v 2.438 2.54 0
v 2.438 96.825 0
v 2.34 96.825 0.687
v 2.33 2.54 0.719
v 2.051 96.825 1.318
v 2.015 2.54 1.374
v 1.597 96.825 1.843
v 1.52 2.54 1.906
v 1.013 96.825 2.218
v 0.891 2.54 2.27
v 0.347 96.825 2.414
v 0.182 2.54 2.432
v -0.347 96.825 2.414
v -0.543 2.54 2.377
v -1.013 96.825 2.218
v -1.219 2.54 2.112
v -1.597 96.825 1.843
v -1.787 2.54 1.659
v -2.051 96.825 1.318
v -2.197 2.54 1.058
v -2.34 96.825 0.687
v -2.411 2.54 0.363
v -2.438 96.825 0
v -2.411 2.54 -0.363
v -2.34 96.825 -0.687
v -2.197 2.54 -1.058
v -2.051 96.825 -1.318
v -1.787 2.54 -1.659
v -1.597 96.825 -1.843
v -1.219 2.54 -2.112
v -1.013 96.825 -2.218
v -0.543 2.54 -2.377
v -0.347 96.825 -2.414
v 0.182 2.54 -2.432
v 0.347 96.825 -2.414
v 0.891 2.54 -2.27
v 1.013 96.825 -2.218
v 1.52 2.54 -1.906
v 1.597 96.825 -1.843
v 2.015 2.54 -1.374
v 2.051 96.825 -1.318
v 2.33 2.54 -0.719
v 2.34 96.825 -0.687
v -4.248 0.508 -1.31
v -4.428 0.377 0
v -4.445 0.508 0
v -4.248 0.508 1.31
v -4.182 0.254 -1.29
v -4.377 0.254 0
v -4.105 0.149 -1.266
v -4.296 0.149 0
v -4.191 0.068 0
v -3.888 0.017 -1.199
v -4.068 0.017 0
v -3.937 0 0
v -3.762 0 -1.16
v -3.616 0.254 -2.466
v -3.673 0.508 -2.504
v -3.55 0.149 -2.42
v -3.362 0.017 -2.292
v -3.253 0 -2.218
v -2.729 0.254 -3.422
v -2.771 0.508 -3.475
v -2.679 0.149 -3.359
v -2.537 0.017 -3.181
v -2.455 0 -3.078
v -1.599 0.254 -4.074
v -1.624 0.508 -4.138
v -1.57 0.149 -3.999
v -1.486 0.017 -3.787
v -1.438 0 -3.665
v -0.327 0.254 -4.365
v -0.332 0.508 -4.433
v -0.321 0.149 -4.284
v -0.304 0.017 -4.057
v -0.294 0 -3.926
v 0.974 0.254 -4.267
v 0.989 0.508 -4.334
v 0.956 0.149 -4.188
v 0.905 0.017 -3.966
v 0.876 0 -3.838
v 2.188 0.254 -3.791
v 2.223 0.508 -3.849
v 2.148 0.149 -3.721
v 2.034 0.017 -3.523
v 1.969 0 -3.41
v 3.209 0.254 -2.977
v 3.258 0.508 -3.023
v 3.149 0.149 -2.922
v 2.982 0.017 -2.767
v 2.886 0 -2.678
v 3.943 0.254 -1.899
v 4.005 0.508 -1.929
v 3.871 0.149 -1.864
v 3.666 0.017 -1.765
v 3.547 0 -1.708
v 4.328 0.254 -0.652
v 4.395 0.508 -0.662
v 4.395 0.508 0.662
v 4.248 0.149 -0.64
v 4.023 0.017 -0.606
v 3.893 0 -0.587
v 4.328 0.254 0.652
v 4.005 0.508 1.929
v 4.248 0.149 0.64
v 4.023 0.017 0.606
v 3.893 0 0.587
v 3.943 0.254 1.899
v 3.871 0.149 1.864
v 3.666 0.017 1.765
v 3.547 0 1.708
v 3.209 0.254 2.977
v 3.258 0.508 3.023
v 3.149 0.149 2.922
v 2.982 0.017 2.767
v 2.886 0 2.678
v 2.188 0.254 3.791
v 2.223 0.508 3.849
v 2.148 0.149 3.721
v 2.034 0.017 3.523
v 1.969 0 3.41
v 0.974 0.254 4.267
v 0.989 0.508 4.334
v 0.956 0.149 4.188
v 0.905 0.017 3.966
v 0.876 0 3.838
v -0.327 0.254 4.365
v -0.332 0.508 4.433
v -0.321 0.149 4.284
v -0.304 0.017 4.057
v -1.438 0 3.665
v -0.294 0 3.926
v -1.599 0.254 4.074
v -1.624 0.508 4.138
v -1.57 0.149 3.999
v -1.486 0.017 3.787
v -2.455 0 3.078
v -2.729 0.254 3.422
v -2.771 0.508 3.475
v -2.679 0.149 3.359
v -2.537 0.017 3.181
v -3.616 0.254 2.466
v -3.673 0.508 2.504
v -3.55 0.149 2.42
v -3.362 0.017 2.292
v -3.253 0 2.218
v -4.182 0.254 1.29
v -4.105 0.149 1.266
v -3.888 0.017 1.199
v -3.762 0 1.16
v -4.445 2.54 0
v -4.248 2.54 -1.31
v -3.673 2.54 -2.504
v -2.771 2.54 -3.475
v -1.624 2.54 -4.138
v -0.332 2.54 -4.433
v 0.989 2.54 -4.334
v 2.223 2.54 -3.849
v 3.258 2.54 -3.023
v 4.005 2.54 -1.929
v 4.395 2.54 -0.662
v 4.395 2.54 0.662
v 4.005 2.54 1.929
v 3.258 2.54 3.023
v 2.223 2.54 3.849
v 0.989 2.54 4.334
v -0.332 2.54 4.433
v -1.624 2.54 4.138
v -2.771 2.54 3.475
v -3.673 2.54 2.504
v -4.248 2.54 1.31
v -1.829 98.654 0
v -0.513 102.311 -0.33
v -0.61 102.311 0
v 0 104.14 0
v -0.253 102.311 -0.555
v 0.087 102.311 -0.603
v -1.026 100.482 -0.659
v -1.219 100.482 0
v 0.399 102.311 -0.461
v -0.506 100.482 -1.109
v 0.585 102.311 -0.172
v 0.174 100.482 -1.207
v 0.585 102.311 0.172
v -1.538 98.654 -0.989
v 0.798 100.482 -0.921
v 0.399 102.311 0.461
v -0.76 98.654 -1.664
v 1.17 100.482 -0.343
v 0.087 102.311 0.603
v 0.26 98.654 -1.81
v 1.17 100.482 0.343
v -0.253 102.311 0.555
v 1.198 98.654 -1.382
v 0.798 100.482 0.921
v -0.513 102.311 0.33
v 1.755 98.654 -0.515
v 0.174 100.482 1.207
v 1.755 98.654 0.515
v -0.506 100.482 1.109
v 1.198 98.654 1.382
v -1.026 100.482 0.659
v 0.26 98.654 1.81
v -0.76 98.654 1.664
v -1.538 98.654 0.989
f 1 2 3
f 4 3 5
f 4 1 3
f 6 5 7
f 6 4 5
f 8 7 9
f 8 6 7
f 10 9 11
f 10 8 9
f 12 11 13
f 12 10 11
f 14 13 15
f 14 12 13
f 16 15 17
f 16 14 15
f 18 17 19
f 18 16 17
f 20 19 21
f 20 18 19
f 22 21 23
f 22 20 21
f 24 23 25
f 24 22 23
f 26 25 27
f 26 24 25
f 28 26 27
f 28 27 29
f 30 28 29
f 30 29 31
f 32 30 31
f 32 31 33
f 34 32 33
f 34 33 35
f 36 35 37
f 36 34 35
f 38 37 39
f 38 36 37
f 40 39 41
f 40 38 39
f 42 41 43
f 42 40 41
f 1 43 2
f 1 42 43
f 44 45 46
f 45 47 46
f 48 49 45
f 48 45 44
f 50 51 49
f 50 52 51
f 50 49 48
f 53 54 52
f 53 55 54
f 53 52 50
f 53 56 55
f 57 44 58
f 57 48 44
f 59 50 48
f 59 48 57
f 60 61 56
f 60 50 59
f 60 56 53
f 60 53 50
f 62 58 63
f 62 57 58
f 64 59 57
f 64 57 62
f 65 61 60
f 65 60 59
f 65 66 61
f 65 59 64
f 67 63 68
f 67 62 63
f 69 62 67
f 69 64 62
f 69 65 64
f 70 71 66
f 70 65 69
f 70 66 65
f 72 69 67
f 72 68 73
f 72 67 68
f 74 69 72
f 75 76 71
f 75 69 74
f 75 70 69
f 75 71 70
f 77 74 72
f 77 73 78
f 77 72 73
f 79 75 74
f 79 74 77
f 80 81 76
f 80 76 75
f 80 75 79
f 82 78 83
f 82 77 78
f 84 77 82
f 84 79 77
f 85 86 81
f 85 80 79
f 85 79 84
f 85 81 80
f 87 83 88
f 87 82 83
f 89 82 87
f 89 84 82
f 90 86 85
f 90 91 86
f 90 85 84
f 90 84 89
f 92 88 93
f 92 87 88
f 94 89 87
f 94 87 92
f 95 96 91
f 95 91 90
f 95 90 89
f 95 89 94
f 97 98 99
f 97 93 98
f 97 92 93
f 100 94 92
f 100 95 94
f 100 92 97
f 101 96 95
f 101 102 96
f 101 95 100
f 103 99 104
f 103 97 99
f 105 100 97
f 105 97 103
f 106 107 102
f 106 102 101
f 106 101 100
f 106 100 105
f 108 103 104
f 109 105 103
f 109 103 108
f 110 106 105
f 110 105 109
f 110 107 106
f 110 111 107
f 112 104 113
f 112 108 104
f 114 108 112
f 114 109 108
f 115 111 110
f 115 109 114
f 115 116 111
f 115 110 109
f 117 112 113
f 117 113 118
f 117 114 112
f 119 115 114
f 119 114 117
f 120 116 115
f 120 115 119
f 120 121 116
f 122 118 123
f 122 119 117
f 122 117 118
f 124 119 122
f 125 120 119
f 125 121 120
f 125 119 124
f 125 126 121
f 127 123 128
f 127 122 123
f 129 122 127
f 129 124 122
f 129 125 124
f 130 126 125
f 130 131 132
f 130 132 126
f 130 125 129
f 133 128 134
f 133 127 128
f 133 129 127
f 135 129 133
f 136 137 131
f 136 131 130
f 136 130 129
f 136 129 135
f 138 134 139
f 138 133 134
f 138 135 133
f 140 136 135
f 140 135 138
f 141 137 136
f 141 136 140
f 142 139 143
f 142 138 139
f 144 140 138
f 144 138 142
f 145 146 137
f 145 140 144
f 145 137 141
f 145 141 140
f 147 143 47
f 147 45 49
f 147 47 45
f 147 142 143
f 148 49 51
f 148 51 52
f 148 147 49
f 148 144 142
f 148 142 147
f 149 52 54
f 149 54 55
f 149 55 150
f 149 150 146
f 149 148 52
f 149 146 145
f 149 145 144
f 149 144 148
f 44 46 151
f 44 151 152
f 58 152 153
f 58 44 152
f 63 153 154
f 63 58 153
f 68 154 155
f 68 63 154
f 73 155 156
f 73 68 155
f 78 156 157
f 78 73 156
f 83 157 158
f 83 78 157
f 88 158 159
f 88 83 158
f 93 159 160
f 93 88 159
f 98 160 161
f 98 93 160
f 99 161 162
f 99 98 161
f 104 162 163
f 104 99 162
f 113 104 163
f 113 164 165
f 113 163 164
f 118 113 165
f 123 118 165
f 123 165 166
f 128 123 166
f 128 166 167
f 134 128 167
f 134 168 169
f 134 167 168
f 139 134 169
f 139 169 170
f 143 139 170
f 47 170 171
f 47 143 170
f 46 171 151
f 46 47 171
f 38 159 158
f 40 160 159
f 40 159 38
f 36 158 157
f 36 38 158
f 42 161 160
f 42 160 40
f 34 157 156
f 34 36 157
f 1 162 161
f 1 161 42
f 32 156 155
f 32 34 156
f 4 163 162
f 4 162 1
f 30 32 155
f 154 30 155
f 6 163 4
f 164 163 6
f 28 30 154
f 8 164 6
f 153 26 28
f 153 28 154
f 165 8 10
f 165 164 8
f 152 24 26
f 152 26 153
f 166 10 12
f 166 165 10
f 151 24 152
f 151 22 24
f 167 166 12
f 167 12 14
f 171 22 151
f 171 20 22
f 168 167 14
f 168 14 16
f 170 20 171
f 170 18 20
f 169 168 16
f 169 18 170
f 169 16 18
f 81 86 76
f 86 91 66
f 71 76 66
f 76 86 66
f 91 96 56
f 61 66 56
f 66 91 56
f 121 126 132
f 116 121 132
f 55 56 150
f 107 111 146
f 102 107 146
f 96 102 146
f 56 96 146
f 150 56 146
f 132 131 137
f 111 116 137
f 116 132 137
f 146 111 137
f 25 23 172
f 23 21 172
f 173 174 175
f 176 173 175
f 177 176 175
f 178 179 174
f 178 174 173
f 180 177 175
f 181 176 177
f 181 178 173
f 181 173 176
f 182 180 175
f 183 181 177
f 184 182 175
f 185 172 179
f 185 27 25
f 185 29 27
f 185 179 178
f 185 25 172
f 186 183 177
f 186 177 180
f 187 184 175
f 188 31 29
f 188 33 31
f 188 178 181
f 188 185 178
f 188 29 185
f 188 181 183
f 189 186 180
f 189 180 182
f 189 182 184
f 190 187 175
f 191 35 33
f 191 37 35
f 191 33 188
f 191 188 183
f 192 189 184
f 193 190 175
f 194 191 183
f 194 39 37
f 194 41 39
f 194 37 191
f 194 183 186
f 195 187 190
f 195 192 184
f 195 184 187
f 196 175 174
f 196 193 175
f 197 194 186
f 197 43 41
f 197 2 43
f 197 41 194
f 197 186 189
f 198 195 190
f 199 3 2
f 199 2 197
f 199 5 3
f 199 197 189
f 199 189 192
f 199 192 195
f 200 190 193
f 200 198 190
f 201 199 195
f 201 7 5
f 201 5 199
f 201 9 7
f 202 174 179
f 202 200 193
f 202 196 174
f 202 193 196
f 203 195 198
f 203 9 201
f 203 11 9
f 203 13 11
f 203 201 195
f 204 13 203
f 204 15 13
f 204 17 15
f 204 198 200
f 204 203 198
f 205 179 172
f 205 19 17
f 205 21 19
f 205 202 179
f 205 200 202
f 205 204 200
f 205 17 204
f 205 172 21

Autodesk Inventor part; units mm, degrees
ref_plane "YZ Plane" through (0, 0, 0) normal (1, 0, 0) x (0, 1, 0)
ref_plane "XZ Plane" through (0, 0, 0) normal (0, 1, 0) x (-1, 0, 0)
sketch "Sketch1" plane through (0, 0, 0) normal (0, 1, 0) x (-1, 0, 0)
  circle A0 centre (0, 0) radius 4.445
  dimension "d0" = 8.89
extrude "Extrusion1" add sketch "Sketch1" along normal blind 2.54
sketch "Sketch2" plane through (0, 2.54, 0) normal (0, 1, 0) x (1, 0, 0)
  circle A0 centre (0, 0) radius 4.445 projected
  circle A1 centre (0, 0) radius 2.4384
  dimension "d5" = 4.8768
extrude "Extrusion2" add sketch "Sketch2" along normal blind 101.6 contours A1
sketch "Sketch3" plane through (0, 104.14, 0) normal (0, 1, 0) x (1, 0, 0)
  circle A0 centre (0, 0) radius 2.4384 projected
  point P0 (0, 2.4384)
ref_plane "Work Plane2" through (0, 104.14, 0) normal (0, 0, -1) x (-1, 0, 0)
ref_plane "Work Plane1" through (0, 104.14, -2.4384) normal (0, 0, -1) x (-1, 0, 0)
sketch "Sketch4" plane through (0, 104.14, 0) normal (0, 0, -1) x (-1, 0, 0)
  line L0 (3.175, -4.7625) -> (3.175, 0)
  line L1 (3.175, 0) -> (0, 0)
  line L2 (0, 0.1023) -> (0, 1.7624)
  line L3 (0, 0) -> (3.175, -9.525)
  line L4 (3.175, -4.7625) -> (3.175, -9.525)
  point P0 (0, -104.14)
revolve "Revolution1" cut sketch "Sketch4" angle 360 about axis through (0, 104.2423, 0) along (0, 1, 0)
fillet "Fillet1" radius 0.508 1 edges at (4.445, 0, 0)
properties part number "nail" material "Steel, Galvanized"
